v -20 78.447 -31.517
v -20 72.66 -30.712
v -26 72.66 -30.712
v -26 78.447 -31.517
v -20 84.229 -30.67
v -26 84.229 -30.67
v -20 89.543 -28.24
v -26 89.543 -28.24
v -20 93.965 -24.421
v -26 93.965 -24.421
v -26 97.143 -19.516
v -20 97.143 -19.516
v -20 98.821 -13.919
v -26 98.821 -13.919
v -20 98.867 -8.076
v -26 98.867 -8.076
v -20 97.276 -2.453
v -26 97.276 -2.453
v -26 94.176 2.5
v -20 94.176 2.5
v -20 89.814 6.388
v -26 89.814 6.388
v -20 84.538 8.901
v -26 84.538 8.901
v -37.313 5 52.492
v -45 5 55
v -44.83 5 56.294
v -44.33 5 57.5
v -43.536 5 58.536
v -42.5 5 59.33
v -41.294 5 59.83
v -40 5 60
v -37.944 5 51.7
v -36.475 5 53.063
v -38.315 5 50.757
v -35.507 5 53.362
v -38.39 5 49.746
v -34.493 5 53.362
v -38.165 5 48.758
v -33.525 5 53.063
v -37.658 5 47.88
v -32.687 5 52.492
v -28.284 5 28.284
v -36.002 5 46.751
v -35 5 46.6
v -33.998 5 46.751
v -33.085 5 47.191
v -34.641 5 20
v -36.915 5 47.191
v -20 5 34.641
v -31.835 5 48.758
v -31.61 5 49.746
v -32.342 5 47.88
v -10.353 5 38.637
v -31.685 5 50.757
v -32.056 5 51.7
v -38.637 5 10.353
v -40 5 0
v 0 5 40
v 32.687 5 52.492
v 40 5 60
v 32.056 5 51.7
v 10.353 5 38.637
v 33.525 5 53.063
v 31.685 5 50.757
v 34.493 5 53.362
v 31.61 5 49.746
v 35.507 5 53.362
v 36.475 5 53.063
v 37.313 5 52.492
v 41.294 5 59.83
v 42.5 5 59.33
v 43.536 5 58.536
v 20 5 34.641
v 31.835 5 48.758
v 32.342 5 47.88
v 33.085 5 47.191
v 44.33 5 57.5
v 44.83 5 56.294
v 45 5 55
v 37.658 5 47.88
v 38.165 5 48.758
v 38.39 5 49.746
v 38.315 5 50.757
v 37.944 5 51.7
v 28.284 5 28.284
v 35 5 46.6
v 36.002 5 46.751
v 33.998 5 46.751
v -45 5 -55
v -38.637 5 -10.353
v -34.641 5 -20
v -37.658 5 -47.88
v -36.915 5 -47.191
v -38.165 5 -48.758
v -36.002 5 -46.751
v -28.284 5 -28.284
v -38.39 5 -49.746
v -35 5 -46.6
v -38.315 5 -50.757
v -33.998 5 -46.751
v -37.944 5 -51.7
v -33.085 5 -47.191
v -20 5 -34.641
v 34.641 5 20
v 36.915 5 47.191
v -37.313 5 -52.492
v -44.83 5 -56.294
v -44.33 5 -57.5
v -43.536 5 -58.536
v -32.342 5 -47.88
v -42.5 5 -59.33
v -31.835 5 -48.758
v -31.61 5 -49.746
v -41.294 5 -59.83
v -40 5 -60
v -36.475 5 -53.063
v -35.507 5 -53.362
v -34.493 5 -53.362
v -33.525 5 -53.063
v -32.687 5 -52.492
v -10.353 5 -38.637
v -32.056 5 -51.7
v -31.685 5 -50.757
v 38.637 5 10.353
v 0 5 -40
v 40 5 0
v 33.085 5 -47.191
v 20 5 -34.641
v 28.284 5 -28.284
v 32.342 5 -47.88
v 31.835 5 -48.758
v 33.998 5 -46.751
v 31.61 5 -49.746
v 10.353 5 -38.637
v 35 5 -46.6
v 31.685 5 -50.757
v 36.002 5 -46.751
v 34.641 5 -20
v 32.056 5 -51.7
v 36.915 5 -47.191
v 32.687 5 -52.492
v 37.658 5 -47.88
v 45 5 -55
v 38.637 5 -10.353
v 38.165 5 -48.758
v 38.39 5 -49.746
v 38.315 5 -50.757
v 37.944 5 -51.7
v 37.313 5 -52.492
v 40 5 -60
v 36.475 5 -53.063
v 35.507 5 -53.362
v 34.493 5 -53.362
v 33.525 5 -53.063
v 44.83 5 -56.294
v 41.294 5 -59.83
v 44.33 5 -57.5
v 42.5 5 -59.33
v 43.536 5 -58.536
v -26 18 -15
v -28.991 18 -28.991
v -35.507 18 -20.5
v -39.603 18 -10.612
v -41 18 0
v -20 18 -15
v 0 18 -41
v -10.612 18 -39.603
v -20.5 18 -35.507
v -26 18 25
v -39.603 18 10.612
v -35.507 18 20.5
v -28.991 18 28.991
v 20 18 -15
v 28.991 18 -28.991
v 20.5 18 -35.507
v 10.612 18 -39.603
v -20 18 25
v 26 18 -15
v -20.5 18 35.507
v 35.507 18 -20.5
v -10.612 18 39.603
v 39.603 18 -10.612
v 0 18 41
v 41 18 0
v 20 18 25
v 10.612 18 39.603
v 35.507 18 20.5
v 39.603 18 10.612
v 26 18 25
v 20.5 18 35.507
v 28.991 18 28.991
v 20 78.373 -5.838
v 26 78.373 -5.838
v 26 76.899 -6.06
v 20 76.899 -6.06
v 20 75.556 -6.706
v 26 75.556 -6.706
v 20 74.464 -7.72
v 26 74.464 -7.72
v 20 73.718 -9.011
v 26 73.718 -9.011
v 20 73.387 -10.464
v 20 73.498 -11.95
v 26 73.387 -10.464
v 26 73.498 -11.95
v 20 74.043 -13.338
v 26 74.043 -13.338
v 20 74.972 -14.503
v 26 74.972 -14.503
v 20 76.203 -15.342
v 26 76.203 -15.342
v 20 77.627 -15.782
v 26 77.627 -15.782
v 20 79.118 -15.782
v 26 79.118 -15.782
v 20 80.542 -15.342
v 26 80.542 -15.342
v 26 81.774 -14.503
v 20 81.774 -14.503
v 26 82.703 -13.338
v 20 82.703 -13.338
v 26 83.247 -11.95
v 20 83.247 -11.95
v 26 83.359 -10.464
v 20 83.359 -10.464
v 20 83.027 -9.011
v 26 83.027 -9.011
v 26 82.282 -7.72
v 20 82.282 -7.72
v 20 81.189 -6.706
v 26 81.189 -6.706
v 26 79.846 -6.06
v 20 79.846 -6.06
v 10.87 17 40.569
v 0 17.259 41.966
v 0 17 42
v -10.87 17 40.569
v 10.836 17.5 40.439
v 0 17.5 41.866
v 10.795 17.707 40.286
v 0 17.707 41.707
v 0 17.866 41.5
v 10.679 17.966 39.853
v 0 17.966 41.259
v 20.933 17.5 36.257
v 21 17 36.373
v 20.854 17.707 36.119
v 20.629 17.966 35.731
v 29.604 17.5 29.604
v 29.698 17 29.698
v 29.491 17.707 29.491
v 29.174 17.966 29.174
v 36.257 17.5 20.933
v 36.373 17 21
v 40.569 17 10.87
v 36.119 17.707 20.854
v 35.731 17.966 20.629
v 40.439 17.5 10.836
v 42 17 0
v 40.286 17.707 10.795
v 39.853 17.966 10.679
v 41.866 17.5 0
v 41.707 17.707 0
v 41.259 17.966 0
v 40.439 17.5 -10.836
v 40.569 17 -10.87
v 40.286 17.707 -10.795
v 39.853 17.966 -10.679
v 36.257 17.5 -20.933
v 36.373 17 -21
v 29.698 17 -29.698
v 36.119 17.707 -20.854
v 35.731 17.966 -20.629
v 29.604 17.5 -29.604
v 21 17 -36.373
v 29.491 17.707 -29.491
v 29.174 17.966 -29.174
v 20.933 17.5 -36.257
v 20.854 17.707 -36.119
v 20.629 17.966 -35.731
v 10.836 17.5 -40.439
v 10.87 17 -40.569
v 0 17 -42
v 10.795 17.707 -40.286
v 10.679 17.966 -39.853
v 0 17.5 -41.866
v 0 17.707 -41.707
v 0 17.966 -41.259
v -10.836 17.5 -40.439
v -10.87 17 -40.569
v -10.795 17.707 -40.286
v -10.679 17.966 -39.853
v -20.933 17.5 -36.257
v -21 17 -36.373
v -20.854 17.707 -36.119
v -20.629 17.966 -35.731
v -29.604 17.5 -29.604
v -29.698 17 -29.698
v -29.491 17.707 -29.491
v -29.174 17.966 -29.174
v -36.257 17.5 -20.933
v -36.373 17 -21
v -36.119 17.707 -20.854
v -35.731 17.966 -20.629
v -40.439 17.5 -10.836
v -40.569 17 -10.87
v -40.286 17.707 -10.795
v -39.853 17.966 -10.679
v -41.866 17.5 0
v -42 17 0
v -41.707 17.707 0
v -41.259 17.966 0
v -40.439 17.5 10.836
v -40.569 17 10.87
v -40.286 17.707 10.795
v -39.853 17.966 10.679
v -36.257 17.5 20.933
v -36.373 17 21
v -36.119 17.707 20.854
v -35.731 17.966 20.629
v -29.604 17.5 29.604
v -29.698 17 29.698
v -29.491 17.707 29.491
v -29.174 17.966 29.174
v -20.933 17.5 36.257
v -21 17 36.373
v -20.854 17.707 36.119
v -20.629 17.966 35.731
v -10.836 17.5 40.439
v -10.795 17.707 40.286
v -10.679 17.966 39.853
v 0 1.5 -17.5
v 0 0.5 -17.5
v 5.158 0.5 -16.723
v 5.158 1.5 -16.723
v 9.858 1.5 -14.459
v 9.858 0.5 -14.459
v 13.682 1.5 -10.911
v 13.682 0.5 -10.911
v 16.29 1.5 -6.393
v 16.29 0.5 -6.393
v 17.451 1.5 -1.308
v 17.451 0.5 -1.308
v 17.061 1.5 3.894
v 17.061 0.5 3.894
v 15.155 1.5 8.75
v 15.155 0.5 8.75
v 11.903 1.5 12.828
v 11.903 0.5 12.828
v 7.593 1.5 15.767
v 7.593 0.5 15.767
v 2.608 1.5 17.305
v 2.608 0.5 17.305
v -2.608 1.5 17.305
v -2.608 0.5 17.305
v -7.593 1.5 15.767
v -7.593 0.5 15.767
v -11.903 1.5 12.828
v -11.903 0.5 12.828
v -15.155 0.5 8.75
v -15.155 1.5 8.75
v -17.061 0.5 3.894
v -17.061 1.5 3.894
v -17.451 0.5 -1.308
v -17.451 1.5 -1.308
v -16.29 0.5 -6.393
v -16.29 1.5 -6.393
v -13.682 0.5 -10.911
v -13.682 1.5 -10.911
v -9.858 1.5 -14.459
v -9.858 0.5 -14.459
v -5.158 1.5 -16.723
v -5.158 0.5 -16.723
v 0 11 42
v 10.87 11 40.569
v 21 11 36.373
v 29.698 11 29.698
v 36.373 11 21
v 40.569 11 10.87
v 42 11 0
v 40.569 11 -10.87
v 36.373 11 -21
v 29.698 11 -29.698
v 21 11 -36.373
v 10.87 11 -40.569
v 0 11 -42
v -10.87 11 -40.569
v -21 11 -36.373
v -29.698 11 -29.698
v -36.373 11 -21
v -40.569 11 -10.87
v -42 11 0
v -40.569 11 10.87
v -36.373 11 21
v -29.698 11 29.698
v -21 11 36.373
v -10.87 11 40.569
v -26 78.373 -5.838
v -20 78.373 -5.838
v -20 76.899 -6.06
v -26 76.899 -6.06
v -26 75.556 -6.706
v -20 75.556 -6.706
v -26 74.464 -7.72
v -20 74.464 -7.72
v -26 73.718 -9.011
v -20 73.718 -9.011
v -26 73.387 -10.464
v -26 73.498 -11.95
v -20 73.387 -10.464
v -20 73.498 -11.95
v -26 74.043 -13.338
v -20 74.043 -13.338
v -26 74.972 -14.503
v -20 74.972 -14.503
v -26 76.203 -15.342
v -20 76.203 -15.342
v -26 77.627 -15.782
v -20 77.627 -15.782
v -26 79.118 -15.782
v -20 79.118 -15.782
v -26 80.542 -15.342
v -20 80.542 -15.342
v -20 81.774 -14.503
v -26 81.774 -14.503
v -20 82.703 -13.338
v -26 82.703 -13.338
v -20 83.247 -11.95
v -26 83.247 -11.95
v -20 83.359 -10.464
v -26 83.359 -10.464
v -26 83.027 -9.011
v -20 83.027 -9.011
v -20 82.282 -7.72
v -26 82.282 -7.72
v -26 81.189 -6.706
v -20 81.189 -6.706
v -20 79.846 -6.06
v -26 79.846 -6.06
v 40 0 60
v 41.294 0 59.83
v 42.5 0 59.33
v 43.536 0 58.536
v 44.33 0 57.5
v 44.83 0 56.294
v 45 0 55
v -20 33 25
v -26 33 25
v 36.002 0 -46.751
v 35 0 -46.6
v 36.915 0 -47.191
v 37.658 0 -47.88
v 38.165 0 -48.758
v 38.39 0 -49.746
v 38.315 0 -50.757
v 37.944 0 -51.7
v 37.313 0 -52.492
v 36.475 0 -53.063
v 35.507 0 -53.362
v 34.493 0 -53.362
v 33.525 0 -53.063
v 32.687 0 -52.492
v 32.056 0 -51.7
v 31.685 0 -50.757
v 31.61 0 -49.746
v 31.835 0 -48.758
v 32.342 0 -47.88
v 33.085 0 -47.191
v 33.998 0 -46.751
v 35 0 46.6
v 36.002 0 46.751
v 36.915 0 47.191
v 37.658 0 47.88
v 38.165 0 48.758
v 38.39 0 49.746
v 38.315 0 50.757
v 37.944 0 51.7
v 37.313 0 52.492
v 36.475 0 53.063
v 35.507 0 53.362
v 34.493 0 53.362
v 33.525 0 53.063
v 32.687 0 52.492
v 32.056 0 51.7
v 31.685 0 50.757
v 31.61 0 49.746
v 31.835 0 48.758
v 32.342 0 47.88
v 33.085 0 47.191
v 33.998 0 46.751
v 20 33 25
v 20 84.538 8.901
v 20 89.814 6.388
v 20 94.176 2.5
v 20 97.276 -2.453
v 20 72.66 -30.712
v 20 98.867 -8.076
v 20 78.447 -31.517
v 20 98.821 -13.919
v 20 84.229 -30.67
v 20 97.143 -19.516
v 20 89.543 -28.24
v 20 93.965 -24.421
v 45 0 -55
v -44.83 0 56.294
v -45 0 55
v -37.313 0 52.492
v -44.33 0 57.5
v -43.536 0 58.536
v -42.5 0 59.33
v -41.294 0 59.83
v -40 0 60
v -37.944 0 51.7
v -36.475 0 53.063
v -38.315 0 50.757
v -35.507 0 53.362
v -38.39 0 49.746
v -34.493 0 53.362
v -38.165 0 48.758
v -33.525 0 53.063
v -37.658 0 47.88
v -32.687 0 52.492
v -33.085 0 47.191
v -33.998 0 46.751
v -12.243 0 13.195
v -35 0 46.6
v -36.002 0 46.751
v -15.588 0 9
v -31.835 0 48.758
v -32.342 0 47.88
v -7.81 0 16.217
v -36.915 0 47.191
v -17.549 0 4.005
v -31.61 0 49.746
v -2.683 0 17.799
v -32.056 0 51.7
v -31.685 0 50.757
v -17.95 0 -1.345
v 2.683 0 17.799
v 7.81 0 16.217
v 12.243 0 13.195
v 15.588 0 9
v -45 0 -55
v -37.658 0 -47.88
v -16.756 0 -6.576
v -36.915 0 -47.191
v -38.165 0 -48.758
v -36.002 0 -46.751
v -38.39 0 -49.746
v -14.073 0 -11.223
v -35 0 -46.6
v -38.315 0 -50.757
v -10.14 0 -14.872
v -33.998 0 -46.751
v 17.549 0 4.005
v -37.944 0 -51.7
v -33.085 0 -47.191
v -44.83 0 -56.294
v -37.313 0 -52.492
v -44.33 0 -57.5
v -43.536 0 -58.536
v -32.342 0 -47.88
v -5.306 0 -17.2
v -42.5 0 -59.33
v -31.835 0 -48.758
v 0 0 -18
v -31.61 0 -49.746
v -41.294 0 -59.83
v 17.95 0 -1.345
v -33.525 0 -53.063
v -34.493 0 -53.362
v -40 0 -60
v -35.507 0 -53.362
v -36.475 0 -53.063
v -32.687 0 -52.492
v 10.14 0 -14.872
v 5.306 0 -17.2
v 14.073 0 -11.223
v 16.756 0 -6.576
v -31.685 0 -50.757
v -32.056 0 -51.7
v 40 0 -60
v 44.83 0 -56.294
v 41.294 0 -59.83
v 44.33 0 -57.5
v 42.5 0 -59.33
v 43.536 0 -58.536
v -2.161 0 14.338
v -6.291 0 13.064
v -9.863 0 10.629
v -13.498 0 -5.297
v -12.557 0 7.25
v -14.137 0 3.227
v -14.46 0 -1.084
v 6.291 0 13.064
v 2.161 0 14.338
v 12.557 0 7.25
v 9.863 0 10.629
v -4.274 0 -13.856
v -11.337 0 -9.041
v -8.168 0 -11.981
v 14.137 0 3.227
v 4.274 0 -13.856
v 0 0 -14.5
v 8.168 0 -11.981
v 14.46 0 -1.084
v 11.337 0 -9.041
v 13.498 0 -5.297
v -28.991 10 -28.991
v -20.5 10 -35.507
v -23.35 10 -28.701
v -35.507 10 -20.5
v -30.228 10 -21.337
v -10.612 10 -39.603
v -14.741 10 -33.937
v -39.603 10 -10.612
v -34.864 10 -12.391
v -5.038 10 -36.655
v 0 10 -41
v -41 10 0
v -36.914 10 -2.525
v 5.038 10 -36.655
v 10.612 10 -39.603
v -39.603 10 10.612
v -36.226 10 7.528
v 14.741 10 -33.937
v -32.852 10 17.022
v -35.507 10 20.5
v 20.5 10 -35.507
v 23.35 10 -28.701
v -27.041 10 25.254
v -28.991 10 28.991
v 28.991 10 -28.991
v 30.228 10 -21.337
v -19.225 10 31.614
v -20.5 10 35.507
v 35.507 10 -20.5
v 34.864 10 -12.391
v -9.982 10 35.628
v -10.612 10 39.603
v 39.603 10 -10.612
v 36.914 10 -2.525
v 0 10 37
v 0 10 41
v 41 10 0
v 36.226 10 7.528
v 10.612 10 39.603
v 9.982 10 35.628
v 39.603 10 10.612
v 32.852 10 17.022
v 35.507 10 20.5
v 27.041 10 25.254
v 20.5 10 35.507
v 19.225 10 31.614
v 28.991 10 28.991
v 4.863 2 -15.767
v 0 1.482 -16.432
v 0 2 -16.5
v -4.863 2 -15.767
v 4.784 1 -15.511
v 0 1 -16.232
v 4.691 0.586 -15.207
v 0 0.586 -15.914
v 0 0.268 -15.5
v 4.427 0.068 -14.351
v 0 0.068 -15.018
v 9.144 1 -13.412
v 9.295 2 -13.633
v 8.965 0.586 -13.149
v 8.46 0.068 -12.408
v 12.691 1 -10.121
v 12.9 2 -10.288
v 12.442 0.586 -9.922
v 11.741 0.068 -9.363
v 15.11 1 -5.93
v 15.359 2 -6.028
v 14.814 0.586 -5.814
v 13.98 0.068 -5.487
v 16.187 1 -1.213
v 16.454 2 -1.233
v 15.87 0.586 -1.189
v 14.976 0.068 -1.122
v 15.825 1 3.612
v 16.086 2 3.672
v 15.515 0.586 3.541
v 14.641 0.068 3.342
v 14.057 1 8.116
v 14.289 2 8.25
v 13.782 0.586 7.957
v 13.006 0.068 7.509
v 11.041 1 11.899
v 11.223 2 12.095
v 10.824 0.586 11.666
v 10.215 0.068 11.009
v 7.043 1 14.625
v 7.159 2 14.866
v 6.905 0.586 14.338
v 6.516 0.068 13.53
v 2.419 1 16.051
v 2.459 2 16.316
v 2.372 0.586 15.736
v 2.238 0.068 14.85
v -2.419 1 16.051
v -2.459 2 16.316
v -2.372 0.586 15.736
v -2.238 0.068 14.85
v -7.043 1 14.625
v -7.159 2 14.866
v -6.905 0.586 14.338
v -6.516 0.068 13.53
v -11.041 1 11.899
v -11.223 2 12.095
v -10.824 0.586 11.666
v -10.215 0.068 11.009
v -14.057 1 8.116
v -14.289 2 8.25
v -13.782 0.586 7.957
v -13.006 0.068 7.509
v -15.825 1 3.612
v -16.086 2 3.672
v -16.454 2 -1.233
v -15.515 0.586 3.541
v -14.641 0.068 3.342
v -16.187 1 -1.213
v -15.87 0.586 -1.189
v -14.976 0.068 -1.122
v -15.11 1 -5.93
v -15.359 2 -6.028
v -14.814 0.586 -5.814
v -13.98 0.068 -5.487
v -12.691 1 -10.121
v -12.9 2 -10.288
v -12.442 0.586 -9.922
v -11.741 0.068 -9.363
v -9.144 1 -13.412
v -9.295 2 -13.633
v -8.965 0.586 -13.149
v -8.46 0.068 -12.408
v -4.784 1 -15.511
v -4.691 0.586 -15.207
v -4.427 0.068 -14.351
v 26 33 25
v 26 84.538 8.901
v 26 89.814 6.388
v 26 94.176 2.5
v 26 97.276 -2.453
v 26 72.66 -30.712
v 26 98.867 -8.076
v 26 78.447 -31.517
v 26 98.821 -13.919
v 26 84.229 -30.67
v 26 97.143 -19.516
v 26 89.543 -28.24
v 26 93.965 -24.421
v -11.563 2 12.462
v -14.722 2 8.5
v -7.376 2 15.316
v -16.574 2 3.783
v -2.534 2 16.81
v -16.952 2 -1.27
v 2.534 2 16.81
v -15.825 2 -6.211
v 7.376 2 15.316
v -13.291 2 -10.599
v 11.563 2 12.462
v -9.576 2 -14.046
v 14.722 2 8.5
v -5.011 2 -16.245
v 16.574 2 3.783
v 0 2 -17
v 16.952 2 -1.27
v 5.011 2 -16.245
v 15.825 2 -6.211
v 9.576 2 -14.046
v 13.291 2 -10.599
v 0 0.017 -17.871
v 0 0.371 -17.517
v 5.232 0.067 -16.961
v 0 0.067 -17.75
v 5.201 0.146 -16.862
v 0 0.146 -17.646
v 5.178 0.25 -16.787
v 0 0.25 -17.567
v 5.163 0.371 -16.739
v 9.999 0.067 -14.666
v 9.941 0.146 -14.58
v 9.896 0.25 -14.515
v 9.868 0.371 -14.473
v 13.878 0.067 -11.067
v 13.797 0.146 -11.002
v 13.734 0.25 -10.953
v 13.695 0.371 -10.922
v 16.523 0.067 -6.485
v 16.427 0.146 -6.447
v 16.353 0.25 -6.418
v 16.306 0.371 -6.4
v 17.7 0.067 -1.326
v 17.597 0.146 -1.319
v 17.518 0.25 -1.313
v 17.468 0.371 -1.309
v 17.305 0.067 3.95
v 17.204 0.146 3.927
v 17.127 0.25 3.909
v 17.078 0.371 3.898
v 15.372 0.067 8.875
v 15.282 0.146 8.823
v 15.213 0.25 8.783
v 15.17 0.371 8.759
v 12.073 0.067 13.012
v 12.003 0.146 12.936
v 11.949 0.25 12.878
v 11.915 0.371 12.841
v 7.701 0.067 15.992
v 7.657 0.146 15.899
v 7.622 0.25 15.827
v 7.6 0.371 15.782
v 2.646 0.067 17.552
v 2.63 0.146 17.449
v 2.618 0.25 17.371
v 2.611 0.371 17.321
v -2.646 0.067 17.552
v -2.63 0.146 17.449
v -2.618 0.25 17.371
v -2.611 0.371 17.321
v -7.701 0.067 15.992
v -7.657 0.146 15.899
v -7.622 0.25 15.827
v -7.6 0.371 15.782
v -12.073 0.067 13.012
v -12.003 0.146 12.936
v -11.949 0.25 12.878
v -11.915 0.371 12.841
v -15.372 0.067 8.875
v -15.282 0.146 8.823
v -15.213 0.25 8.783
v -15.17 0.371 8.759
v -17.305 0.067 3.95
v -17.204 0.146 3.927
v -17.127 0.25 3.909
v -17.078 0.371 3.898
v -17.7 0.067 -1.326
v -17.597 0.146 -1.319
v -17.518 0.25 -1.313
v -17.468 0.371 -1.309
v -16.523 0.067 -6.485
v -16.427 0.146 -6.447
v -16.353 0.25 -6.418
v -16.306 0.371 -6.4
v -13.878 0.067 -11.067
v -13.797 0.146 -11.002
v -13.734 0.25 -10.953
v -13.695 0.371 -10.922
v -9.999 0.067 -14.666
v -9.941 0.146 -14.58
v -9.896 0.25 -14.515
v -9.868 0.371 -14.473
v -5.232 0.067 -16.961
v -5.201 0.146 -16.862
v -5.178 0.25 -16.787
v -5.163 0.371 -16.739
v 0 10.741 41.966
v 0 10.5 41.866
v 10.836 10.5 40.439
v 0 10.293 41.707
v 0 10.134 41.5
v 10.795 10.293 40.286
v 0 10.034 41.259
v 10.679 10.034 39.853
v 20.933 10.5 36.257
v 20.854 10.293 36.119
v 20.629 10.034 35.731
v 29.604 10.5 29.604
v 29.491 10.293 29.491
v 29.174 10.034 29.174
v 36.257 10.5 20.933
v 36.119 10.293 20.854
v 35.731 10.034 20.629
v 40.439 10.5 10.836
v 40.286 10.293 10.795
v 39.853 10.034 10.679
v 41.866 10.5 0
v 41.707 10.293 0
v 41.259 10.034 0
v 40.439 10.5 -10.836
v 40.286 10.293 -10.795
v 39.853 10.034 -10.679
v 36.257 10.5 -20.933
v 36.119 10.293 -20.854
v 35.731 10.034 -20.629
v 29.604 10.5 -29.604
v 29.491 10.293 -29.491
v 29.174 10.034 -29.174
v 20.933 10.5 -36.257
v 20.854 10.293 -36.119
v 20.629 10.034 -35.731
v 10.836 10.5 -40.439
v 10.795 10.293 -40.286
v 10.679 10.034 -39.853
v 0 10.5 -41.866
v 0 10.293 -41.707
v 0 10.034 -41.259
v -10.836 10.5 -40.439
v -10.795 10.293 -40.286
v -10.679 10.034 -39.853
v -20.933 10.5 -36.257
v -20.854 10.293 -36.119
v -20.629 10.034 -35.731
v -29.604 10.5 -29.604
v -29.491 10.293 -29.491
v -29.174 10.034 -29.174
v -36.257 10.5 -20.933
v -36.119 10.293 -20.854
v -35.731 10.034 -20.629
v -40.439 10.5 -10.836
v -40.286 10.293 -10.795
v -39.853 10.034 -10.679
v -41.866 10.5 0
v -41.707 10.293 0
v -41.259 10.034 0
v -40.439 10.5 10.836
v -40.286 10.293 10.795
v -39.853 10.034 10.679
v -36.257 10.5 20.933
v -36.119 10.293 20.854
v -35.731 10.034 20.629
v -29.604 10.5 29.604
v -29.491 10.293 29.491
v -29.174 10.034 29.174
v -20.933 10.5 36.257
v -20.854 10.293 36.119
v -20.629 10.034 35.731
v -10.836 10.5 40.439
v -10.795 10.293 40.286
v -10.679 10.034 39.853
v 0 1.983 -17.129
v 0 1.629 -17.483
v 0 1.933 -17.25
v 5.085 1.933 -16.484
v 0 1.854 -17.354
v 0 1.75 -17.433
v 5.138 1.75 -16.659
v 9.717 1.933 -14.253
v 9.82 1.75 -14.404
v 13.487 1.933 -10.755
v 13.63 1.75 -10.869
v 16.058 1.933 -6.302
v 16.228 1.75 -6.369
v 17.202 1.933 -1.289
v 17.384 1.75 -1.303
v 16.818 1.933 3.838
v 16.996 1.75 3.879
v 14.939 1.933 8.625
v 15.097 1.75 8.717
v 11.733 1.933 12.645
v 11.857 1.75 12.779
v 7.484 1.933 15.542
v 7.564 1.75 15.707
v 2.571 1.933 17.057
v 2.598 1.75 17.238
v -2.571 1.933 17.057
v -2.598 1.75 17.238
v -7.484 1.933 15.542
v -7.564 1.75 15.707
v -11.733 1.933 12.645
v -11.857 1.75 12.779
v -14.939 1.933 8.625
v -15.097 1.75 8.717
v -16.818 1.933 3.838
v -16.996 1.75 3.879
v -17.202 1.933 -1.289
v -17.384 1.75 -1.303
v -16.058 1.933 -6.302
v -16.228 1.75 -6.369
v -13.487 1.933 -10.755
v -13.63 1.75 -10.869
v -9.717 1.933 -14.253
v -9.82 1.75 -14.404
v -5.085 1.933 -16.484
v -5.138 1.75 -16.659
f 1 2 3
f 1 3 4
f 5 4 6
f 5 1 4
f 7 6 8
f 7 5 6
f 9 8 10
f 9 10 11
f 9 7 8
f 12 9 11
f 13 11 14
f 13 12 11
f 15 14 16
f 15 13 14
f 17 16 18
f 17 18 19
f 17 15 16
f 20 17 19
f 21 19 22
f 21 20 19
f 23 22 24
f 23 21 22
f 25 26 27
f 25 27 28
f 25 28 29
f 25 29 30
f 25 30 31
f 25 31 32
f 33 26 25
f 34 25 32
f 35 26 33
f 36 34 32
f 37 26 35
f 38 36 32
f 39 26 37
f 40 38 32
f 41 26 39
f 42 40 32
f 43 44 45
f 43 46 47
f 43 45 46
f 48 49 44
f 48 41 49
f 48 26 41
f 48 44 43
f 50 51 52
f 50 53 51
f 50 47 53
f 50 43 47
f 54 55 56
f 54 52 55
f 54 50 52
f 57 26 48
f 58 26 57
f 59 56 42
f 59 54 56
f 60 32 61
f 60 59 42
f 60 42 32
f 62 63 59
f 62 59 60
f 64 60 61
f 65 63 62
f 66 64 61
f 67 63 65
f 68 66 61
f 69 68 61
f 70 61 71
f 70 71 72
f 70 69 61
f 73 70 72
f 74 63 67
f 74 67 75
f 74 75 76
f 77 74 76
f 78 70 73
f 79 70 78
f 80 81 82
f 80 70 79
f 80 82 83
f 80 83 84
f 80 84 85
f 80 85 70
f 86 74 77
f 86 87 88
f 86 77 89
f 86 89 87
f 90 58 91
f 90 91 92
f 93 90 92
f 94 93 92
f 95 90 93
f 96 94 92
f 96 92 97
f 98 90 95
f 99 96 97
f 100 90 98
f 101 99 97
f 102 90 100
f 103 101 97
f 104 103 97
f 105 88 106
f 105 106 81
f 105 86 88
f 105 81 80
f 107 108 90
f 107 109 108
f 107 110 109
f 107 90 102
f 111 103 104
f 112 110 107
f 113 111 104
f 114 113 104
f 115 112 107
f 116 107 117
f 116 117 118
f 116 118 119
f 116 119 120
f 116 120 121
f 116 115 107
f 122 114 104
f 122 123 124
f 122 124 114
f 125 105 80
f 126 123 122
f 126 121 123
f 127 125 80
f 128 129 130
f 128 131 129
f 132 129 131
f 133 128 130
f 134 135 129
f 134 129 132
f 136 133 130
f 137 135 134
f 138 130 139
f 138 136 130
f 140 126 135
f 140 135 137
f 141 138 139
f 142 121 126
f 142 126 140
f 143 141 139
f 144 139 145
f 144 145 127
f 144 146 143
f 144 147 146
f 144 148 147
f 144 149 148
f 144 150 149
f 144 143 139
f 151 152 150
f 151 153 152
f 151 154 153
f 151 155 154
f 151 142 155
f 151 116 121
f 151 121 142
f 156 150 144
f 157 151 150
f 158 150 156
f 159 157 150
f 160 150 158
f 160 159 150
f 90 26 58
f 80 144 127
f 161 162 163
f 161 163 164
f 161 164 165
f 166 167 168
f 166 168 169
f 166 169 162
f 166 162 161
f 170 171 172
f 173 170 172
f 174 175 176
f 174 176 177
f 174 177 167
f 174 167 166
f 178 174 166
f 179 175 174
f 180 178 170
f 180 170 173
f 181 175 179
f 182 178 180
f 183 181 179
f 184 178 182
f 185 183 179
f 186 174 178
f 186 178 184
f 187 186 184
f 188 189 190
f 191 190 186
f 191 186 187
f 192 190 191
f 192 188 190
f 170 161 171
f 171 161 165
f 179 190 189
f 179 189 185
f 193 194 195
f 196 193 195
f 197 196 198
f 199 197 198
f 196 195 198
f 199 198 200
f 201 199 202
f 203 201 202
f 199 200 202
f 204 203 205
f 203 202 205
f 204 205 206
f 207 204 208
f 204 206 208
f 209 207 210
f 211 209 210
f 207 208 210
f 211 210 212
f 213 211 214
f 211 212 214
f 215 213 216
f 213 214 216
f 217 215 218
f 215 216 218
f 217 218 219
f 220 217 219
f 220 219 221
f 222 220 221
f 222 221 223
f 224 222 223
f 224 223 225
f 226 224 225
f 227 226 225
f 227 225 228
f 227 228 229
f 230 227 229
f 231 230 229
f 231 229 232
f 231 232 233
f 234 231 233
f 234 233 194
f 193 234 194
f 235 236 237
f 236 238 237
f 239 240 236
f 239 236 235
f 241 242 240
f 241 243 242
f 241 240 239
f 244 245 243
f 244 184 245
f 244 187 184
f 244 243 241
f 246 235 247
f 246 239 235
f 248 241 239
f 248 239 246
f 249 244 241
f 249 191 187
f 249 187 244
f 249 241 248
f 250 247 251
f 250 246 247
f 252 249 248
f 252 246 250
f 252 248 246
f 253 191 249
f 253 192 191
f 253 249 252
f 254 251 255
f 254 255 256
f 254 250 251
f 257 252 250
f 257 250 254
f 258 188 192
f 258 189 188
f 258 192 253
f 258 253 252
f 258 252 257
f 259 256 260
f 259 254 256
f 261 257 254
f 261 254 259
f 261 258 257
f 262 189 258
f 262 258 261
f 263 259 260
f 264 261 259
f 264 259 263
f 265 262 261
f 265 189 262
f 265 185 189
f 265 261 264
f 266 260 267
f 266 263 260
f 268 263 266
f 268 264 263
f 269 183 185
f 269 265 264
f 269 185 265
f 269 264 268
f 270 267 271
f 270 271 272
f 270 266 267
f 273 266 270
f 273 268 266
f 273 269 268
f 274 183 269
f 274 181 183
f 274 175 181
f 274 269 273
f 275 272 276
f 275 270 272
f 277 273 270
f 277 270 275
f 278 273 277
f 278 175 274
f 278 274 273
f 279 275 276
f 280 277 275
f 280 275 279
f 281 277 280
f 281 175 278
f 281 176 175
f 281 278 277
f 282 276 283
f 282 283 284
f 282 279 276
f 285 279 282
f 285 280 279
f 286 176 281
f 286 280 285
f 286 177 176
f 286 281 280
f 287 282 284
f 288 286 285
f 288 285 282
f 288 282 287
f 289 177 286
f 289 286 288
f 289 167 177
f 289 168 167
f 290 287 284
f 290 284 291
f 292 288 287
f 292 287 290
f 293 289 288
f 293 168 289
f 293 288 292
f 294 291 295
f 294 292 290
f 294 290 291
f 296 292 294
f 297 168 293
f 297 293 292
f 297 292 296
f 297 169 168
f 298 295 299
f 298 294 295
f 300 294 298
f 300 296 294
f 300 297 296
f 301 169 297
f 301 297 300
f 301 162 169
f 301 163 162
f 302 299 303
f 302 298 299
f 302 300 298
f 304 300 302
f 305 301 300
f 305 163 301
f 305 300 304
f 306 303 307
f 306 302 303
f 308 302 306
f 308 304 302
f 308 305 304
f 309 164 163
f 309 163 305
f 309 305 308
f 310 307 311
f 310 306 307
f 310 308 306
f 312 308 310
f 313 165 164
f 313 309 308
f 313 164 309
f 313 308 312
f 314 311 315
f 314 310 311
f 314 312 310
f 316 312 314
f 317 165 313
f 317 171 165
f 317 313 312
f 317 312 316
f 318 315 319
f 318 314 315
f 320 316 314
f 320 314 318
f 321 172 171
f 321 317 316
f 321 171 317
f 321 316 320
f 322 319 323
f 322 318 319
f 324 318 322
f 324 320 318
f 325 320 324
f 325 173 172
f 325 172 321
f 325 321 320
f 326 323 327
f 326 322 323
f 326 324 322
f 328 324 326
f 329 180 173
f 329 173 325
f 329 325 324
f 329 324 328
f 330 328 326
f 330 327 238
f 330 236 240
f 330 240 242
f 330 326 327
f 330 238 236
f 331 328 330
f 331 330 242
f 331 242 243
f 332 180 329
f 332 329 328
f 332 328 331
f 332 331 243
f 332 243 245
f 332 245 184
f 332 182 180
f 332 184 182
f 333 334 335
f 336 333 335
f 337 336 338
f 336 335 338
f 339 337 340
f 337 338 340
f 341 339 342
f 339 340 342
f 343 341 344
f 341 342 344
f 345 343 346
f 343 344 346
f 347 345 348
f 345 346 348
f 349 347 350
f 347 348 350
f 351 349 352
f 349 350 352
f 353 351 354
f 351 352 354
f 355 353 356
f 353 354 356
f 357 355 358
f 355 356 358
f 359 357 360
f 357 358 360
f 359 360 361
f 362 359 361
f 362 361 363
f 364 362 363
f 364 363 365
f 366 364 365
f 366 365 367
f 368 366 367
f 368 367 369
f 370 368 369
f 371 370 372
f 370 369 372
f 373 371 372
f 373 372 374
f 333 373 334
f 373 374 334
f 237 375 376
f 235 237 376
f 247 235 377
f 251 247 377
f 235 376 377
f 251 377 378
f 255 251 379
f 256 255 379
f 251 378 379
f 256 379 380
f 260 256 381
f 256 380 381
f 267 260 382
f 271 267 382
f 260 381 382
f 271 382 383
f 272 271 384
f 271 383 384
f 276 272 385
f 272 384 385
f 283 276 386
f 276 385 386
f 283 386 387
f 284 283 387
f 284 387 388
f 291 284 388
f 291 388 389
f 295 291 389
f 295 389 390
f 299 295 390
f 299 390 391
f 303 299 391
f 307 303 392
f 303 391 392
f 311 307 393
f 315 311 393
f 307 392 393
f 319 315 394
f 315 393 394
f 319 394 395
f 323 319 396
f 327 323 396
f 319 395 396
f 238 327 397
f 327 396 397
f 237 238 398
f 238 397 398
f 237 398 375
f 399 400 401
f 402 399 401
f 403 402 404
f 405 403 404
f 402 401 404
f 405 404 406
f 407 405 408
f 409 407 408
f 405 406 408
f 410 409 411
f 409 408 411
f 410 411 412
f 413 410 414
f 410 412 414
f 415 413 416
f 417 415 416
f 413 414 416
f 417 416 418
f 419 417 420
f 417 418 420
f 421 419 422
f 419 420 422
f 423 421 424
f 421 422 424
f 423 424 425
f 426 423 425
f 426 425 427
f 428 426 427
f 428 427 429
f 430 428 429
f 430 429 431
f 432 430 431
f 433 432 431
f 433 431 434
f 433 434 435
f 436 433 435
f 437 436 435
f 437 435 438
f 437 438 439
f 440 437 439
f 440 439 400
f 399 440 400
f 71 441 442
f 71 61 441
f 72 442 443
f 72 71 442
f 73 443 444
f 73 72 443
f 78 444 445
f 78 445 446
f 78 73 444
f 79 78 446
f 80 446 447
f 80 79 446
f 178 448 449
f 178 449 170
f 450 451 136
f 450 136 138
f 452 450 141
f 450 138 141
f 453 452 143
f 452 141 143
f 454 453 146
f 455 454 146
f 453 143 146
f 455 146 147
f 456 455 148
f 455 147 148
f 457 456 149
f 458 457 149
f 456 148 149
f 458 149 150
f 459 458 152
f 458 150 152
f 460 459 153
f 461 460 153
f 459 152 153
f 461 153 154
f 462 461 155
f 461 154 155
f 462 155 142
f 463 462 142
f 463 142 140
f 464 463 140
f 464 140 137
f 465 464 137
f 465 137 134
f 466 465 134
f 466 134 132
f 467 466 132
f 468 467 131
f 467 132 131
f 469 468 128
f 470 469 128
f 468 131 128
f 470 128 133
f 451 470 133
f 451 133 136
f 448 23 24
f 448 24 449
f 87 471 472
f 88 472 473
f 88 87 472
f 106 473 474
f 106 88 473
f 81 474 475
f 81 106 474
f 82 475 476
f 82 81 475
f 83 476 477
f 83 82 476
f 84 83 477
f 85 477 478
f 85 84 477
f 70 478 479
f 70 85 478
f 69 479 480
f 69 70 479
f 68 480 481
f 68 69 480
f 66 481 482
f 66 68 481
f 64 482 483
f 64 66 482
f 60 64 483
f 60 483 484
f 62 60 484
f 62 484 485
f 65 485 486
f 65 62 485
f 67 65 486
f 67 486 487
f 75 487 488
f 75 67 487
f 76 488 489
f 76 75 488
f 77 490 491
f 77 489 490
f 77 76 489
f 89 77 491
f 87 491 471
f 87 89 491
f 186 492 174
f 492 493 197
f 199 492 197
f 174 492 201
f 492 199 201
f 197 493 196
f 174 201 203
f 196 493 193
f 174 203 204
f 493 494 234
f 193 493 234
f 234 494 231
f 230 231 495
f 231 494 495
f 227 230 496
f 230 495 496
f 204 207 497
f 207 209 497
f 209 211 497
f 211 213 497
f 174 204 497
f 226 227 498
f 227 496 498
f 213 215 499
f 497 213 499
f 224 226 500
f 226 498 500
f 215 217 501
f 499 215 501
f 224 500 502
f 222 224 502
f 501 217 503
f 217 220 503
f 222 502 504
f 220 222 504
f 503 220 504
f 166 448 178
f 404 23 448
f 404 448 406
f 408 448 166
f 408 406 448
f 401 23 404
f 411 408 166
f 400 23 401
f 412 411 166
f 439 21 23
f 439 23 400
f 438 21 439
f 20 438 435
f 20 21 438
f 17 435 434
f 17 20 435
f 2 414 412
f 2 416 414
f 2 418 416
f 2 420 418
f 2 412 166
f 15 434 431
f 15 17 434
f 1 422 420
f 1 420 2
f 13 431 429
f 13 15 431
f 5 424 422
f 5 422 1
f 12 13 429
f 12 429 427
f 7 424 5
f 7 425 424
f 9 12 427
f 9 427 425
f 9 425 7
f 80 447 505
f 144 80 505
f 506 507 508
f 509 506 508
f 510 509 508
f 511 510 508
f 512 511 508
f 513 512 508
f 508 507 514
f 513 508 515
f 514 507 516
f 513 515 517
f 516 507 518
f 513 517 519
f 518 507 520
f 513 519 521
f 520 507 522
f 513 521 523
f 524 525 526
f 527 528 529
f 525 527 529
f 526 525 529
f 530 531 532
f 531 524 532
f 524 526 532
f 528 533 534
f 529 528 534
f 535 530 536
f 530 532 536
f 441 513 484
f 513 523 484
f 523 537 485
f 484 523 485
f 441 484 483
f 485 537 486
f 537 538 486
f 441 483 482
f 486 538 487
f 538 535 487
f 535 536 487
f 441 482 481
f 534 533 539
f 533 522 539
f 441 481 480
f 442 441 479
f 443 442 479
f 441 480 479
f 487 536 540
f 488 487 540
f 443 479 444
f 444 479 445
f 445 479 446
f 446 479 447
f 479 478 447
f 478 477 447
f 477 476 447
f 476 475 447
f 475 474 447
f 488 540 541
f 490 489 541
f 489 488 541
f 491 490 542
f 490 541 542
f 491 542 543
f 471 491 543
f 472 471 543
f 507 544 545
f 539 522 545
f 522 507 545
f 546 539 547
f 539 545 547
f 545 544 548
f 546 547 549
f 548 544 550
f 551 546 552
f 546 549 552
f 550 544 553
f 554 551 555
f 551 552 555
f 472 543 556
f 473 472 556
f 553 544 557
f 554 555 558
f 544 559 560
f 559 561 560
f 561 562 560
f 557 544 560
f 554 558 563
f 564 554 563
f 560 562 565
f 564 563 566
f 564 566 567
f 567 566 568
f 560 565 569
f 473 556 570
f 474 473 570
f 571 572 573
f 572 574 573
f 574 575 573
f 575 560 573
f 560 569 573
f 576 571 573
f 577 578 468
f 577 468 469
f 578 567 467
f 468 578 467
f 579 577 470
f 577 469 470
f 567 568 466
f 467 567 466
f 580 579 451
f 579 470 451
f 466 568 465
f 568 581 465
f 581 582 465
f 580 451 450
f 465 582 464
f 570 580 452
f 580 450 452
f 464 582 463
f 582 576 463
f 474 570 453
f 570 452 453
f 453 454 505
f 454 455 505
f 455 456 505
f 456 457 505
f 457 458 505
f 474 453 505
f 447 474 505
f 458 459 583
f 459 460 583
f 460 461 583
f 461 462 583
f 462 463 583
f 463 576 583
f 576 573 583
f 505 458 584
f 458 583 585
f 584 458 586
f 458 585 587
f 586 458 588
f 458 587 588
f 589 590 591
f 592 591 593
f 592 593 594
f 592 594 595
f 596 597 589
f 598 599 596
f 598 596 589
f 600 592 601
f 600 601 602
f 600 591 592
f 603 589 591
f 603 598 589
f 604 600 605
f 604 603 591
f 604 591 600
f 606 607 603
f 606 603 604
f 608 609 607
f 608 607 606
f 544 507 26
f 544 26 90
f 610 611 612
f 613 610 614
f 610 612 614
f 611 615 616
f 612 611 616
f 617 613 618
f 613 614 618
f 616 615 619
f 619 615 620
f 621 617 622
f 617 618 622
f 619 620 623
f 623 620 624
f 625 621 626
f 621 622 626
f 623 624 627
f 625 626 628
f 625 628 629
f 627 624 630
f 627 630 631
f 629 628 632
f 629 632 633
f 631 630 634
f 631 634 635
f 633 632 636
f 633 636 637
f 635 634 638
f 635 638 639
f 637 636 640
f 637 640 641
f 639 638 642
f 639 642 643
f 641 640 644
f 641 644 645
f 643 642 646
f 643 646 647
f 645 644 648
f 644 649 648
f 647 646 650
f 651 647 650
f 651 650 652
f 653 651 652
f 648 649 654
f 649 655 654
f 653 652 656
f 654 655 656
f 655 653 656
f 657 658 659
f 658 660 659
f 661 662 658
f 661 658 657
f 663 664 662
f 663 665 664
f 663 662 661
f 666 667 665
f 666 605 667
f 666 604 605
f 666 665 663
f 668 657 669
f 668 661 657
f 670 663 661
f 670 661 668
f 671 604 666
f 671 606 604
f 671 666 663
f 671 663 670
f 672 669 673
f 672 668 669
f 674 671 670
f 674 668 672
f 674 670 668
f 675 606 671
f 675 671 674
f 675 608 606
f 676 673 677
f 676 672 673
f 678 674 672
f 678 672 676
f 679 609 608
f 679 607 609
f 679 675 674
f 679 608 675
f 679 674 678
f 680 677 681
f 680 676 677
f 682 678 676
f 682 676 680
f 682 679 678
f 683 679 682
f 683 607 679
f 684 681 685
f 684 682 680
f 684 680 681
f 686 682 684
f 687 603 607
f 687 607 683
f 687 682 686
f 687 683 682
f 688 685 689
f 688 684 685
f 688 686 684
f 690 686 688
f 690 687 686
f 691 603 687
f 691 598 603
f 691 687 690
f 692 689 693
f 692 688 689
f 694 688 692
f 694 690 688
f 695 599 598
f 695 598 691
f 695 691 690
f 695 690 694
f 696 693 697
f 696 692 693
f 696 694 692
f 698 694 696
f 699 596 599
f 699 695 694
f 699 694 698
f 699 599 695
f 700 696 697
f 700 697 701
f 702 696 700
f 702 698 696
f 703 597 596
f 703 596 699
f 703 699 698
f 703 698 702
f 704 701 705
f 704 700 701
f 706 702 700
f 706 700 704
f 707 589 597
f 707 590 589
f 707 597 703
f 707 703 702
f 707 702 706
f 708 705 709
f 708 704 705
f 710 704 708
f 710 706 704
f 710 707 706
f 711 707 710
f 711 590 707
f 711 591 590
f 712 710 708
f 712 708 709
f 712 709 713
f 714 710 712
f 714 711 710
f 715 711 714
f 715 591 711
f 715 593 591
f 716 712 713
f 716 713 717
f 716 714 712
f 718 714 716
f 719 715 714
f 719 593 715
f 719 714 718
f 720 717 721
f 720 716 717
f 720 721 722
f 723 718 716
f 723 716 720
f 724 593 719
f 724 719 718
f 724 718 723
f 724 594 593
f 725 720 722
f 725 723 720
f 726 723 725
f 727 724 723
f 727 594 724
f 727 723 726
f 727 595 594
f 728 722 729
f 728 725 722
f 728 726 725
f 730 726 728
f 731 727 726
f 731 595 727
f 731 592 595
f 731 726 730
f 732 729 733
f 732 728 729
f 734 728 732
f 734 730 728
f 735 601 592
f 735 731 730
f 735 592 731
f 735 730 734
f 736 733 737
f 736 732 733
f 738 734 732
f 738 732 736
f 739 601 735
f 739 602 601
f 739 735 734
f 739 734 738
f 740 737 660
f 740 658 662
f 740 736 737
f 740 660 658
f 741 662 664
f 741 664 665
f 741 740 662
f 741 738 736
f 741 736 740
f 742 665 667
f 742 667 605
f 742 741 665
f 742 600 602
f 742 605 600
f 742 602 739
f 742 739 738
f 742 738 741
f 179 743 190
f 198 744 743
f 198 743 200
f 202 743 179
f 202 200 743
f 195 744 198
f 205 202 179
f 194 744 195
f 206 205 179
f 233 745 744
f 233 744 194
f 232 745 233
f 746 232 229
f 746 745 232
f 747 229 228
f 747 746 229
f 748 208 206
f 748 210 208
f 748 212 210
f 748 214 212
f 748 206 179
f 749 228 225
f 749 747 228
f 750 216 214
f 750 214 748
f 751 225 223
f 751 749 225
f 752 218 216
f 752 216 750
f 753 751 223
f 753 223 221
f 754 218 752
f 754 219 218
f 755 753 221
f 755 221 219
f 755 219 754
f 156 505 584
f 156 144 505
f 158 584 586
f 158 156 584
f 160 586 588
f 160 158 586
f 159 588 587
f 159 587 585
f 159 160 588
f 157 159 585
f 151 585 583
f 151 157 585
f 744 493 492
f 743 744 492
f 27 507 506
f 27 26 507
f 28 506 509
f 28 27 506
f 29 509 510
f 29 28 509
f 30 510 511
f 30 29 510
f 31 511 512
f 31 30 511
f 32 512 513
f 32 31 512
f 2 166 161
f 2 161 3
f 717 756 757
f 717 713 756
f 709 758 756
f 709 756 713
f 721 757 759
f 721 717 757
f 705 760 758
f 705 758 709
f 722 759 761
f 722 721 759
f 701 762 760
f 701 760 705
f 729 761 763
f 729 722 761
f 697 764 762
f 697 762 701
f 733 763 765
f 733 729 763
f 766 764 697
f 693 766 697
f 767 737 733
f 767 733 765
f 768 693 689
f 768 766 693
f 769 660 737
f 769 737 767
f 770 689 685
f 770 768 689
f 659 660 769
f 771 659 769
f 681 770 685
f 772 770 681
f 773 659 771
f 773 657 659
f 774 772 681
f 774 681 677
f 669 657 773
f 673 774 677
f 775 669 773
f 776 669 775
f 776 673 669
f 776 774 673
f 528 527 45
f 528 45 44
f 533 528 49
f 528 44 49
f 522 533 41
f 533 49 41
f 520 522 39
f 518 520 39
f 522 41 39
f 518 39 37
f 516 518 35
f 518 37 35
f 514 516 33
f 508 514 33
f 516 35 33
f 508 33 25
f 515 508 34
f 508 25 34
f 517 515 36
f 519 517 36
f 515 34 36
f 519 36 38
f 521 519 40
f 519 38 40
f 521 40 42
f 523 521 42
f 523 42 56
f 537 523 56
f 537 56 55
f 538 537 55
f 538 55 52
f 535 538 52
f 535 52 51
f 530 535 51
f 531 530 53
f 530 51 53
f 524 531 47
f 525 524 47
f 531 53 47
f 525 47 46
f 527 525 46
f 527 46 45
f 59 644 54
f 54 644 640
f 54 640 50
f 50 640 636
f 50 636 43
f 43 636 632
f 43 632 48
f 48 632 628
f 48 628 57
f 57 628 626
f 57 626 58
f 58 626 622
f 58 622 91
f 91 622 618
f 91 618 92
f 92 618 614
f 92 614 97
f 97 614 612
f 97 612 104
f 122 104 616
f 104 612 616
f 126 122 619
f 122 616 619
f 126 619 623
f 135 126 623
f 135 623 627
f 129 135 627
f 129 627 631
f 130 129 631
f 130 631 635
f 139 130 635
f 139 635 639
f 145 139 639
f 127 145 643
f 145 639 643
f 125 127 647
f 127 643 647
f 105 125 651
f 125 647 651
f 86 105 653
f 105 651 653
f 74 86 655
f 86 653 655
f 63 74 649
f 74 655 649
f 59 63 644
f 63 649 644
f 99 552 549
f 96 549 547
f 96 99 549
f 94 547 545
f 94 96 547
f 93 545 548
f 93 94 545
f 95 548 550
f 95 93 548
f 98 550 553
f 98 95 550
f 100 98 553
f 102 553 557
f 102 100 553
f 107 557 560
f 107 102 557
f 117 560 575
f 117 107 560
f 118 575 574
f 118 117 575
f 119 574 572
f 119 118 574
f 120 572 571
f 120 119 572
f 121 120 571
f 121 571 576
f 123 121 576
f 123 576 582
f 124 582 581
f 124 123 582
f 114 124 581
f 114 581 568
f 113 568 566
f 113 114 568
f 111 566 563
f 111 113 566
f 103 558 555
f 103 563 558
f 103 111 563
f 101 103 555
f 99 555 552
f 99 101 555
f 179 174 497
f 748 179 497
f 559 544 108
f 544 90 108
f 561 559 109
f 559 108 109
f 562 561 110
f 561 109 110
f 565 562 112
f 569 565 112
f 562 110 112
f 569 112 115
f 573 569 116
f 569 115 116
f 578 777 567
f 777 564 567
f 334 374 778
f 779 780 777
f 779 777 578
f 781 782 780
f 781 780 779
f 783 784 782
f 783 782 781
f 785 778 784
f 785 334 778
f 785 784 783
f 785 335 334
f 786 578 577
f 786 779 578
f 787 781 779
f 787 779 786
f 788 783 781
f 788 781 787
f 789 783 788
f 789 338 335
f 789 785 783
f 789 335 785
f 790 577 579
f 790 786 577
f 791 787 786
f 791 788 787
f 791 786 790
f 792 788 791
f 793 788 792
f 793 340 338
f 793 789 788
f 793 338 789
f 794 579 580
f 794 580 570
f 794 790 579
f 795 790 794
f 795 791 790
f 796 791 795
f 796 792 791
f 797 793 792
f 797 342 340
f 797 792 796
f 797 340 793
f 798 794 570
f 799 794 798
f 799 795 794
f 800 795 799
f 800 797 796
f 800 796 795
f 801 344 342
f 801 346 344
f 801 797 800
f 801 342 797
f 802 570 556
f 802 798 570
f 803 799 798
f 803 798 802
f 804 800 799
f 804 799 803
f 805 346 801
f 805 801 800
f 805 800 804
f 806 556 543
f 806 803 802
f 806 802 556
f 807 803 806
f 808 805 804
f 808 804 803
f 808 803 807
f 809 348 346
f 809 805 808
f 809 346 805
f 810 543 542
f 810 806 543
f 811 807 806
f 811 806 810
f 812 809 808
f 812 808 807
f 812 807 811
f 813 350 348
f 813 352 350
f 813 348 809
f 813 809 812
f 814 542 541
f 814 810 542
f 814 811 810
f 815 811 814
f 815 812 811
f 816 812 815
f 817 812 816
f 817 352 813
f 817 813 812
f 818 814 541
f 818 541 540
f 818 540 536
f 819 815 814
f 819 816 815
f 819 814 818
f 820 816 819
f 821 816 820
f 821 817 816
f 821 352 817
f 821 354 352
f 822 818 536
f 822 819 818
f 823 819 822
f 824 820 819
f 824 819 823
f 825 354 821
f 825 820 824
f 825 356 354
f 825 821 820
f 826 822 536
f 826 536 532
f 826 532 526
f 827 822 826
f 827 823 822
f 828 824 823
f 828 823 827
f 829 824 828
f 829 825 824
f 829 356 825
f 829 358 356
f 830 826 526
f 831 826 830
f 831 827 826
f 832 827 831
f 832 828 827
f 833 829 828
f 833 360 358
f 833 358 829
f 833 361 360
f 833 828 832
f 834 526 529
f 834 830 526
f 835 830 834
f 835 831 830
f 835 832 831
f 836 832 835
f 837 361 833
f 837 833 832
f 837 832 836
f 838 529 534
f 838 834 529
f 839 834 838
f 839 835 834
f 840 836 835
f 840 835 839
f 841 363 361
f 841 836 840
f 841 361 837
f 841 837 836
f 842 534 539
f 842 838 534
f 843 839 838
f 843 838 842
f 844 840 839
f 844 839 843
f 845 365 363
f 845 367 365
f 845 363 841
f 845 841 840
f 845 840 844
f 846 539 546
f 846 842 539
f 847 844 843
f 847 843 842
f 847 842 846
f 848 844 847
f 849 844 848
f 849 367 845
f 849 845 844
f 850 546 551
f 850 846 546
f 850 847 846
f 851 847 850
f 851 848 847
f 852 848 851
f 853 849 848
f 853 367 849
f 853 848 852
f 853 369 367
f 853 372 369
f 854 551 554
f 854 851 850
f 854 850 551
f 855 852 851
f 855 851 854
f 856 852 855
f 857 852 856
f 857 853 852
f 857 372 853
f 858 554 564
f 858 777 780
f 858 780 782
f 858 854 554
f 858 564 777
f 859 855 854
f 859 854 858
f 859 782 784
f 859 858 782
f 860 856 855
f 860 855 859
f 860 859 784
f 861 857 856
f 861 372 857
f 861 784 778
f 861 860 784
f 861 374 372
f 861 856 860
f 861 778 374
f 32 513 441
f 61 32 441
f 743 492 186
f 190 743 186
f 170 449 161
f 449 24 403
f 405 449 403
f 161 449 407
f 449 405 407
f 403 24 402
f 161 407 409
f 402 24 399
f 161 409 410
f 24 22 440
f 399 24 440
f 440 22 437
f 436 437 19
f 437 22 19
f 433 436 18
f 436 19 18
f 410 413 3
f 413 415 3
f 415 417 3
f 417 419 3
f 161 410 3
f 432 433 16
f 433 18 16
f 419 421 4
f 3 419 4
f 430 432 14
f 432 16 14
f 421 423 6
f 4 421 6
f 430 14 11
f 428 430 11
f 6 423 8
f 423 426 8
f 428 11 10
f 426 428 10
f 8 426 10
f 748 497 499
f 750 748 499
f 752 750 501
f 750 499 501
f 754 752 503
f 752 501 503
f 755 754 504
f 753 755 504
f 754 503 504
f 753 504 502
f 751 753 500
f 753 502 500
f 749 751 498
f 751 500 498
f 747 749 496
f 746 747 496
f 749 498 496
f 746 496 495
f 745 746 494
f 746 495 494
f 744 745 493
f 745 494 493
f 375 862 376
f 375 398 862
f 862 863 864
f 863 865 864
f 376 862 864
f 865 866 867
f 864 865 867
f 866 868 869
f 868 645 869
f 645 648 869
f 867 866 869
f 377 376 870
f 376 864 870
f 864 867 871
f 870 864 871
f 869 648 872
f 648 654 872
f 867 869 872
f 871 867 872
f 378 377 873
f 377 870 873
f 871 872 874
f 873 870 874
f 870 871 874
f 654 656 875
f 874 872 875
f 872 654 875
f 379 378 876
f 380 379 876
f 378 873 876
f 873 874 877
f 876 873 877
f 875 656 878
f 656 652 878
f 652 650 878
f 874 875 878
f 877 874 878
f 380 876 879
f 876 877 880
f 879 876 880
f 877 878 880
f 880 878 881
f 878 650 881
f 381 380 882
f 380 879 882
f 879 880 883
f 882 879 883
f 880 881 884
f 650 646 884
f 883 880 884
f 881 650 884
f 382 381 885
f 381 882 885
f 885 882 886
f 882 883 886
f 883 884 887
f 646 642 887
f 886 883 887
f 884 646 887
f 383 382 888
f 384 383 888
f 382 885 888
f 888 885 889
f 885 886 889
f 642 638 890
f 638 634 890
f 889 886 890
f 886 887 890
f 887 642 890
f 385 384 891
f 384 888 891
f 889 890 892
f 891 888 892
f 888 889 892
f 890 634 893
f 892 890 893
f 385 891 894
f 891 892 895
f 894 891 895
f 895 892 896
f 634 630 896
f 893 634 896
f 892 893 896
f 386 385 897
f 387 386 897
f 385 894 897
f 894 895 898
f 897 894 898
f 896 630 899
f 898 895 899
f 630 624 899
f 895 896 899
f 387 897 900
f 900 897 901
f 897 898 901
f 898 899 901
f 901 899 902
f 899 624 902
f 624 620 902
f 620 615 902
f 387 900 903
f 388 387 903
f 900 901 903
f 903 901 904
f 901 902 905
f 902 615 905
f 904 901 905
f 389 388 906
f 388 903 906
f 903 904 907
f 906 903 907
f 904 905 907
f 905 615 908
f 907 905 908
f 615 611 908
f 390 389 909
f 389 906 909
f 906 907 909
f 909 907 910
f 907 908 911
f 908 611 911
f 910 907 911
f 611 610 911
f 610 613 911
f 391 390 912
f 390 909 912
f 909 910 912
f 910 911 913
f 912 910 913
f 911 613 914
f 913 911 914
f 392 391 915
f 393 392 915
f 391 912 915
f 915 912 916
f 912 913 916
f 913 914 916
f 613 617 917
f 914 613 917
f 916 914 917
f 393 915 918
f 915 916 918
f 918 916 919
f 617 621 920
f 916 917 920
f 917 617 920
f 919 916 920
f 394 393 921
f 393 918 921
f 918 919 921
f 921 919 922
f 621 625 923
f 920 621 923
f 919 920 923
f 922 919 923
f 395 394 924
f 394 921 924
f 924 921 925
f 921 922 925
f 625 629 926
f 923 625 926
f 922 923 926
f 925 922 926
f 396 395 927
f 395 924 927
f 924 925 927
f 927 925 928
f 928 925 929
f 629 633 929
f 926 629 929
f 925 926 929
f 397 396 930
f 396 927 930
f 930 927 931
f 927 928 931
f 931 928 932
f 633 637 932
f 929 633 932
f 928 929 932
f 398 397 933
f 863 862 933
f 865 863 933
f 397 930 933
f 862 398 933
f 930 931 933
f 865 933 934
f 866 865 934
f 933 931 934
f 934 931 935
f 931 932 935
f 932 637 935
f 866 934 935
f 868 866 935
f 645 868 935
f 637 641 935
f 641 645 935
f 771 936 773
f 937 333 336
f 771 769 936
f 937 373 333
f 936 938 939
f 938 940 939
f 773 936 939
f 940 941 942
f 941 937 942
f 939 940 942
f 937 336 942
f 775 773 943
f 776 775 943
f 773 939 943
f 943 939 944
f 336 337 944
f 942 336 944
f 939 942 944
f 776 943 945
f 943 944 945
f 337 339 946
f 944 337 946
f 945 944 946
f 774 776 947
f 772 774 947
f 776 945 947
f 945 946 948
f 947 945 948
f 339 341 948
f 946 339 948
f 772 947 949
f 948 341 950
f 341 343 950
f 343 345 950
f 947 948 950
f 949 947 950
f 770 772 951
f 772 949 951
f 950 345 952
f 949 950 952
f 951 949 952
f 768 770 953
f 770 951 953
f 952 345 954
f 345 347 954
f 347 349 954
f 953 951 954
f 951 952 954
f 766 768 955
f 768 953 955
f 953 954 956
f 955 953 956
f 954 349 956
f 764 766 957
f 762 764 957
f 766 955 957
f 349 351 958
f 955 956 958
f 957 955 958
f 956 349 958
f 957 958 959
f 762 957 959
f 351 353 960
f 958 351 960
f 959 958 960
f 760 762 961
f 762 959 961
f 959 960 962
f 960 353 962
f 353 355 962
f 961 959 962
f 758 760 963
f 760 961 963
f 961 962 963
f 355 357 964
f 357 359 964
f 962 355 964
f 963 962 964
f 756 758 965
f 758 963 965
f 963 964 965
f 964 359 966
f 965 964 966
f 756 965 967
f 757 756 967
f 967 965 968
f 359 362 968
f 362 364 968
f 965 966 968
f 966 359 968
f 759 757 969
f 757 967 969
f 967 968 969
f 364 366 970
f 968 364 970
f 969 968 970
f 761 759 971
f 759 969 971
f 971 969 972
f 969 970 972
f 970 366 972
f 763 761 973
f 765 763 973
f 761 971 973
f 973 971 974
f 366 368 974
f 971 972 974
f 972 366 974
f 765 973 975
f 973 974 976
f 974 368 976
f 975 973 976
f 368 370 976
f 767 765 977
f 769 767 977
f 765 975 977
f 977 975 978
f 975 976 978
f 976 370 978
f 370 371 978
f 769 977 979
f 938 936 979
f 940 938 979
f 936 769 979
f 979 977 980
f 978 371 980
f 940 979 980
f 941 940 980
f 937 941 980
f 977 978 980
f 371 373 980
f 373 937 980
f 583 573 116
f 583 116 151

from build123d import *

# Parameters (mm, degrees)
SKETCH_1_W          = 90
SKETCH_1_H          = 120
EXTRUDE_1_DEPTH     = 5
FILLET_3_R          = 5
SKETCH_21_R         = 17.5
CUT_EXTRUDE_1_DEPTH = 2
FILLET_4_R          = 0.5
SKETCH_22_R         = 16.5
EXTRUDE_2_DEPTH     = 2
FILLET_5_R          = 2
FILLET_6_R          = 0.5
SKETCH_27_R         = 42
EXTRUDE_4_DEPTH     = 8
EXTRUDE_5_DEPTH     = 6
SKETCH_31_R         = 5
CUT_EXTRUDE_2_DEPTH = 85
FILLET_7_R          = 1
FILLET_8_R          = 1


with BuildPart() as part:
    # 草图1 → 凸台-拉伸1 (new body)
    with BuildSketch(Plane(origin=(0, 0, 0), x_dir=(1, 0, 0), z_dir=(0, 1, 0))):
        Rectangle(SKETCH_1_W, SKETCH_1_H)
    extrude(amount=EXTRUDE_1_DEPTH)

    # 圆角3
    fillet_3_edges = [part.edges().sort_by_distance(p)[0] for p in [
        (45, 2.5, 60),
        (-45, 2.5, 60),
        (-45, 2.5, -60),
        (45, 2.5, -60),
    ]]
    fillet(fillet_3_edges, radius=FILLET_3_R)

    # 草图17 → M8 螺纹孔1 (revolve, cut)
    with BuildSketch(Plane(origin=(-35, 5, -50), x_dir=(0, 0, 1), z_dir=(1, 0, 0))):
        Polygon((0, 0), (0, 21.792926105), (3.4, 19.75), (3.4, 0), align=None)
    hole_wizard_m8_1 = revolve(axis=Axis((-35, 11.35, -50), (0, -1, 0)), mode=Mode.SUBTRACT)

    # 镜向4: M8 螺纹孔1 across plane
    add(hole_wizard_m8_1.mirror(Plane(origin=(0, 0, 0), x_dir=(0, 0, 1), z_dir=(1, 0, 0))), mode=Mode.SUBTRACT)

    # 镜向5: M8 螺纹孔1 across plane
    add(hole_wizard_m8_1.mirror(Plane.XY), mode=Mode.SUBTRACT)

    # 镜向5 copy 1 sketch → 镜向5 copy 1 (revolve, cut)
    with BuildSketch(Plane(origin=(35, 5, 50), x_dir=(0, 0, -1), z_dir=(-1, 0, 0))):
        Polygon((0, 0), (0, 21.792926105), (3.4, 19.75), (3.4, 0), align=None)
    revolve(axis=Axis((35, 11.35, 50), (0, -1, 0)), mode=Mode.SUBTRACT)

    # 草图21 → 切除-拉伸1 (cut)
    with BuildSketch(Plane.XZ):
        with Locations(Location((0, 0, 0), (0, 0, 270))):
            Circle(SKETCH_21_R)
    extrude(amount=-CUT_EXTRUDE_1_DEPTH, mode=Mode.SUBTRACT)

    # 圆角4
    fillet_4_edges = [part.edges().sort_by_distance(p)[0] for p in [
        (0, 0, 17.5),
    ]]
    fillet(fillet_4_edges, radius=FILLET_4_R)

    # 草图22 → 凸台-拉伸2 (add)
    with BuildSketch(Plane.XZ.offset(-2)):
        with Locations(Location((0, 0, 0), (0, 0, 270))):
            Circle(SKETCH_22_R)
    extrude(amount=EXTRUDE_2_DEPTH)

    # 圆角5
    fillet_5_edges = [part.edges().sort_by_distance(p)[0] for p in [
        (0, 0, 16.5),
    ]]
    fillet(fillet_5_edges, radius=FILLET_5_R - 0.0001)  # a hair under: the kernel refuses the full size

    # 圆角6
    fillet_6_edges = [part.edges().sort_by_distance(p)[0] for p in [
        (0, 2, 17.5),
    ]]
    fillet(fillet_6_edges, radius=FILLET_6_R)

    # 草图26 → 旋转1 (revolve)
    with BuildSketch(Plane(origin=(0, 0, 0), x_dir=(0, 0, -1), z_dir=(1, 0, 0))):
        Polygon((0, 5), (-40, 5), (-37, 10), (0, 10), align=None)
    revolve(axis=Axis((0, 10, 0), (0, -1, 0)))

    # 草图27 → 凸台-拉伸4 (add)
    with BuildSketch(Plane(origin=(0, 10, 0), x_dir=(1, 0, 0), z_dir=(0, 1, 0))):
        with Locations(Location((0, 0, 0), (0, 0, 270))):
            Circle(SKETCH_27_R)
    extrude(amount=EXTRUDE_4_DEPTH)

    # 草图30 → 凸台-拉伸5 (add)
    with BuildSketch(Plane(origin=(20, 0, 0), x_dir=(0, 0, -1), z_dir=(1, 0, 0))):
        with BuildLine():
            Line((0, 18), (15, 18))
            Line((15, 18), (30.712075667, 72.659714105))
            ThreePointArc((30.712075667, 72.659714105), (16.777367703, 98.180524284), (-8.901037595, 84.538407896))
            Line((-8.901037595, 84.538407896), (-25, 33))
            Line((-25, 33), (-25, 18))
            Line((-25, 18), (0, 18))
        make_face()
    extrude_5 = extrude(amount=EXTRUDE_5_DEPTH)

    # 镜向6: 凸台-拉伸5 across plane
    add(extrude_5.mirror(Plane(origin=(0, 0, 0), x_dir=(0, 0, 1), z_dir=(1, 0, 0))))

    # 草图31 → 切除-拉伸2 (cut)
    with BuildSketch(Plane(origin=(26, 0, 0), x_dir=(0, 0, -1), z_dir=(1, 0, 0))):
        with Locations(Location((10.837632854, 78.372673904, 0), (0, 0, 180))):
            Circle(SKETCH_31_R)
    extrude(amount=-CUT_EXTRUDE_2_DEPTH, mode=Mode.SUBTRACT)

    # 圆角7
    fillet_7_edges = [part.edges().sort_by_distance(p)[0] for p in [
        (0, 10, -42),
    ]]
    fillet(fillet_7_edges, radius=FILLET_7_R)

    # 圆角8
    fillet_8_edges = [part.edges().sort_by_distance(p)[0] for p in [
        (0, 18, -42),
    ]]
    fillet(fillet_8_edges, radius=FILLET_8_R)


solid = part.part
